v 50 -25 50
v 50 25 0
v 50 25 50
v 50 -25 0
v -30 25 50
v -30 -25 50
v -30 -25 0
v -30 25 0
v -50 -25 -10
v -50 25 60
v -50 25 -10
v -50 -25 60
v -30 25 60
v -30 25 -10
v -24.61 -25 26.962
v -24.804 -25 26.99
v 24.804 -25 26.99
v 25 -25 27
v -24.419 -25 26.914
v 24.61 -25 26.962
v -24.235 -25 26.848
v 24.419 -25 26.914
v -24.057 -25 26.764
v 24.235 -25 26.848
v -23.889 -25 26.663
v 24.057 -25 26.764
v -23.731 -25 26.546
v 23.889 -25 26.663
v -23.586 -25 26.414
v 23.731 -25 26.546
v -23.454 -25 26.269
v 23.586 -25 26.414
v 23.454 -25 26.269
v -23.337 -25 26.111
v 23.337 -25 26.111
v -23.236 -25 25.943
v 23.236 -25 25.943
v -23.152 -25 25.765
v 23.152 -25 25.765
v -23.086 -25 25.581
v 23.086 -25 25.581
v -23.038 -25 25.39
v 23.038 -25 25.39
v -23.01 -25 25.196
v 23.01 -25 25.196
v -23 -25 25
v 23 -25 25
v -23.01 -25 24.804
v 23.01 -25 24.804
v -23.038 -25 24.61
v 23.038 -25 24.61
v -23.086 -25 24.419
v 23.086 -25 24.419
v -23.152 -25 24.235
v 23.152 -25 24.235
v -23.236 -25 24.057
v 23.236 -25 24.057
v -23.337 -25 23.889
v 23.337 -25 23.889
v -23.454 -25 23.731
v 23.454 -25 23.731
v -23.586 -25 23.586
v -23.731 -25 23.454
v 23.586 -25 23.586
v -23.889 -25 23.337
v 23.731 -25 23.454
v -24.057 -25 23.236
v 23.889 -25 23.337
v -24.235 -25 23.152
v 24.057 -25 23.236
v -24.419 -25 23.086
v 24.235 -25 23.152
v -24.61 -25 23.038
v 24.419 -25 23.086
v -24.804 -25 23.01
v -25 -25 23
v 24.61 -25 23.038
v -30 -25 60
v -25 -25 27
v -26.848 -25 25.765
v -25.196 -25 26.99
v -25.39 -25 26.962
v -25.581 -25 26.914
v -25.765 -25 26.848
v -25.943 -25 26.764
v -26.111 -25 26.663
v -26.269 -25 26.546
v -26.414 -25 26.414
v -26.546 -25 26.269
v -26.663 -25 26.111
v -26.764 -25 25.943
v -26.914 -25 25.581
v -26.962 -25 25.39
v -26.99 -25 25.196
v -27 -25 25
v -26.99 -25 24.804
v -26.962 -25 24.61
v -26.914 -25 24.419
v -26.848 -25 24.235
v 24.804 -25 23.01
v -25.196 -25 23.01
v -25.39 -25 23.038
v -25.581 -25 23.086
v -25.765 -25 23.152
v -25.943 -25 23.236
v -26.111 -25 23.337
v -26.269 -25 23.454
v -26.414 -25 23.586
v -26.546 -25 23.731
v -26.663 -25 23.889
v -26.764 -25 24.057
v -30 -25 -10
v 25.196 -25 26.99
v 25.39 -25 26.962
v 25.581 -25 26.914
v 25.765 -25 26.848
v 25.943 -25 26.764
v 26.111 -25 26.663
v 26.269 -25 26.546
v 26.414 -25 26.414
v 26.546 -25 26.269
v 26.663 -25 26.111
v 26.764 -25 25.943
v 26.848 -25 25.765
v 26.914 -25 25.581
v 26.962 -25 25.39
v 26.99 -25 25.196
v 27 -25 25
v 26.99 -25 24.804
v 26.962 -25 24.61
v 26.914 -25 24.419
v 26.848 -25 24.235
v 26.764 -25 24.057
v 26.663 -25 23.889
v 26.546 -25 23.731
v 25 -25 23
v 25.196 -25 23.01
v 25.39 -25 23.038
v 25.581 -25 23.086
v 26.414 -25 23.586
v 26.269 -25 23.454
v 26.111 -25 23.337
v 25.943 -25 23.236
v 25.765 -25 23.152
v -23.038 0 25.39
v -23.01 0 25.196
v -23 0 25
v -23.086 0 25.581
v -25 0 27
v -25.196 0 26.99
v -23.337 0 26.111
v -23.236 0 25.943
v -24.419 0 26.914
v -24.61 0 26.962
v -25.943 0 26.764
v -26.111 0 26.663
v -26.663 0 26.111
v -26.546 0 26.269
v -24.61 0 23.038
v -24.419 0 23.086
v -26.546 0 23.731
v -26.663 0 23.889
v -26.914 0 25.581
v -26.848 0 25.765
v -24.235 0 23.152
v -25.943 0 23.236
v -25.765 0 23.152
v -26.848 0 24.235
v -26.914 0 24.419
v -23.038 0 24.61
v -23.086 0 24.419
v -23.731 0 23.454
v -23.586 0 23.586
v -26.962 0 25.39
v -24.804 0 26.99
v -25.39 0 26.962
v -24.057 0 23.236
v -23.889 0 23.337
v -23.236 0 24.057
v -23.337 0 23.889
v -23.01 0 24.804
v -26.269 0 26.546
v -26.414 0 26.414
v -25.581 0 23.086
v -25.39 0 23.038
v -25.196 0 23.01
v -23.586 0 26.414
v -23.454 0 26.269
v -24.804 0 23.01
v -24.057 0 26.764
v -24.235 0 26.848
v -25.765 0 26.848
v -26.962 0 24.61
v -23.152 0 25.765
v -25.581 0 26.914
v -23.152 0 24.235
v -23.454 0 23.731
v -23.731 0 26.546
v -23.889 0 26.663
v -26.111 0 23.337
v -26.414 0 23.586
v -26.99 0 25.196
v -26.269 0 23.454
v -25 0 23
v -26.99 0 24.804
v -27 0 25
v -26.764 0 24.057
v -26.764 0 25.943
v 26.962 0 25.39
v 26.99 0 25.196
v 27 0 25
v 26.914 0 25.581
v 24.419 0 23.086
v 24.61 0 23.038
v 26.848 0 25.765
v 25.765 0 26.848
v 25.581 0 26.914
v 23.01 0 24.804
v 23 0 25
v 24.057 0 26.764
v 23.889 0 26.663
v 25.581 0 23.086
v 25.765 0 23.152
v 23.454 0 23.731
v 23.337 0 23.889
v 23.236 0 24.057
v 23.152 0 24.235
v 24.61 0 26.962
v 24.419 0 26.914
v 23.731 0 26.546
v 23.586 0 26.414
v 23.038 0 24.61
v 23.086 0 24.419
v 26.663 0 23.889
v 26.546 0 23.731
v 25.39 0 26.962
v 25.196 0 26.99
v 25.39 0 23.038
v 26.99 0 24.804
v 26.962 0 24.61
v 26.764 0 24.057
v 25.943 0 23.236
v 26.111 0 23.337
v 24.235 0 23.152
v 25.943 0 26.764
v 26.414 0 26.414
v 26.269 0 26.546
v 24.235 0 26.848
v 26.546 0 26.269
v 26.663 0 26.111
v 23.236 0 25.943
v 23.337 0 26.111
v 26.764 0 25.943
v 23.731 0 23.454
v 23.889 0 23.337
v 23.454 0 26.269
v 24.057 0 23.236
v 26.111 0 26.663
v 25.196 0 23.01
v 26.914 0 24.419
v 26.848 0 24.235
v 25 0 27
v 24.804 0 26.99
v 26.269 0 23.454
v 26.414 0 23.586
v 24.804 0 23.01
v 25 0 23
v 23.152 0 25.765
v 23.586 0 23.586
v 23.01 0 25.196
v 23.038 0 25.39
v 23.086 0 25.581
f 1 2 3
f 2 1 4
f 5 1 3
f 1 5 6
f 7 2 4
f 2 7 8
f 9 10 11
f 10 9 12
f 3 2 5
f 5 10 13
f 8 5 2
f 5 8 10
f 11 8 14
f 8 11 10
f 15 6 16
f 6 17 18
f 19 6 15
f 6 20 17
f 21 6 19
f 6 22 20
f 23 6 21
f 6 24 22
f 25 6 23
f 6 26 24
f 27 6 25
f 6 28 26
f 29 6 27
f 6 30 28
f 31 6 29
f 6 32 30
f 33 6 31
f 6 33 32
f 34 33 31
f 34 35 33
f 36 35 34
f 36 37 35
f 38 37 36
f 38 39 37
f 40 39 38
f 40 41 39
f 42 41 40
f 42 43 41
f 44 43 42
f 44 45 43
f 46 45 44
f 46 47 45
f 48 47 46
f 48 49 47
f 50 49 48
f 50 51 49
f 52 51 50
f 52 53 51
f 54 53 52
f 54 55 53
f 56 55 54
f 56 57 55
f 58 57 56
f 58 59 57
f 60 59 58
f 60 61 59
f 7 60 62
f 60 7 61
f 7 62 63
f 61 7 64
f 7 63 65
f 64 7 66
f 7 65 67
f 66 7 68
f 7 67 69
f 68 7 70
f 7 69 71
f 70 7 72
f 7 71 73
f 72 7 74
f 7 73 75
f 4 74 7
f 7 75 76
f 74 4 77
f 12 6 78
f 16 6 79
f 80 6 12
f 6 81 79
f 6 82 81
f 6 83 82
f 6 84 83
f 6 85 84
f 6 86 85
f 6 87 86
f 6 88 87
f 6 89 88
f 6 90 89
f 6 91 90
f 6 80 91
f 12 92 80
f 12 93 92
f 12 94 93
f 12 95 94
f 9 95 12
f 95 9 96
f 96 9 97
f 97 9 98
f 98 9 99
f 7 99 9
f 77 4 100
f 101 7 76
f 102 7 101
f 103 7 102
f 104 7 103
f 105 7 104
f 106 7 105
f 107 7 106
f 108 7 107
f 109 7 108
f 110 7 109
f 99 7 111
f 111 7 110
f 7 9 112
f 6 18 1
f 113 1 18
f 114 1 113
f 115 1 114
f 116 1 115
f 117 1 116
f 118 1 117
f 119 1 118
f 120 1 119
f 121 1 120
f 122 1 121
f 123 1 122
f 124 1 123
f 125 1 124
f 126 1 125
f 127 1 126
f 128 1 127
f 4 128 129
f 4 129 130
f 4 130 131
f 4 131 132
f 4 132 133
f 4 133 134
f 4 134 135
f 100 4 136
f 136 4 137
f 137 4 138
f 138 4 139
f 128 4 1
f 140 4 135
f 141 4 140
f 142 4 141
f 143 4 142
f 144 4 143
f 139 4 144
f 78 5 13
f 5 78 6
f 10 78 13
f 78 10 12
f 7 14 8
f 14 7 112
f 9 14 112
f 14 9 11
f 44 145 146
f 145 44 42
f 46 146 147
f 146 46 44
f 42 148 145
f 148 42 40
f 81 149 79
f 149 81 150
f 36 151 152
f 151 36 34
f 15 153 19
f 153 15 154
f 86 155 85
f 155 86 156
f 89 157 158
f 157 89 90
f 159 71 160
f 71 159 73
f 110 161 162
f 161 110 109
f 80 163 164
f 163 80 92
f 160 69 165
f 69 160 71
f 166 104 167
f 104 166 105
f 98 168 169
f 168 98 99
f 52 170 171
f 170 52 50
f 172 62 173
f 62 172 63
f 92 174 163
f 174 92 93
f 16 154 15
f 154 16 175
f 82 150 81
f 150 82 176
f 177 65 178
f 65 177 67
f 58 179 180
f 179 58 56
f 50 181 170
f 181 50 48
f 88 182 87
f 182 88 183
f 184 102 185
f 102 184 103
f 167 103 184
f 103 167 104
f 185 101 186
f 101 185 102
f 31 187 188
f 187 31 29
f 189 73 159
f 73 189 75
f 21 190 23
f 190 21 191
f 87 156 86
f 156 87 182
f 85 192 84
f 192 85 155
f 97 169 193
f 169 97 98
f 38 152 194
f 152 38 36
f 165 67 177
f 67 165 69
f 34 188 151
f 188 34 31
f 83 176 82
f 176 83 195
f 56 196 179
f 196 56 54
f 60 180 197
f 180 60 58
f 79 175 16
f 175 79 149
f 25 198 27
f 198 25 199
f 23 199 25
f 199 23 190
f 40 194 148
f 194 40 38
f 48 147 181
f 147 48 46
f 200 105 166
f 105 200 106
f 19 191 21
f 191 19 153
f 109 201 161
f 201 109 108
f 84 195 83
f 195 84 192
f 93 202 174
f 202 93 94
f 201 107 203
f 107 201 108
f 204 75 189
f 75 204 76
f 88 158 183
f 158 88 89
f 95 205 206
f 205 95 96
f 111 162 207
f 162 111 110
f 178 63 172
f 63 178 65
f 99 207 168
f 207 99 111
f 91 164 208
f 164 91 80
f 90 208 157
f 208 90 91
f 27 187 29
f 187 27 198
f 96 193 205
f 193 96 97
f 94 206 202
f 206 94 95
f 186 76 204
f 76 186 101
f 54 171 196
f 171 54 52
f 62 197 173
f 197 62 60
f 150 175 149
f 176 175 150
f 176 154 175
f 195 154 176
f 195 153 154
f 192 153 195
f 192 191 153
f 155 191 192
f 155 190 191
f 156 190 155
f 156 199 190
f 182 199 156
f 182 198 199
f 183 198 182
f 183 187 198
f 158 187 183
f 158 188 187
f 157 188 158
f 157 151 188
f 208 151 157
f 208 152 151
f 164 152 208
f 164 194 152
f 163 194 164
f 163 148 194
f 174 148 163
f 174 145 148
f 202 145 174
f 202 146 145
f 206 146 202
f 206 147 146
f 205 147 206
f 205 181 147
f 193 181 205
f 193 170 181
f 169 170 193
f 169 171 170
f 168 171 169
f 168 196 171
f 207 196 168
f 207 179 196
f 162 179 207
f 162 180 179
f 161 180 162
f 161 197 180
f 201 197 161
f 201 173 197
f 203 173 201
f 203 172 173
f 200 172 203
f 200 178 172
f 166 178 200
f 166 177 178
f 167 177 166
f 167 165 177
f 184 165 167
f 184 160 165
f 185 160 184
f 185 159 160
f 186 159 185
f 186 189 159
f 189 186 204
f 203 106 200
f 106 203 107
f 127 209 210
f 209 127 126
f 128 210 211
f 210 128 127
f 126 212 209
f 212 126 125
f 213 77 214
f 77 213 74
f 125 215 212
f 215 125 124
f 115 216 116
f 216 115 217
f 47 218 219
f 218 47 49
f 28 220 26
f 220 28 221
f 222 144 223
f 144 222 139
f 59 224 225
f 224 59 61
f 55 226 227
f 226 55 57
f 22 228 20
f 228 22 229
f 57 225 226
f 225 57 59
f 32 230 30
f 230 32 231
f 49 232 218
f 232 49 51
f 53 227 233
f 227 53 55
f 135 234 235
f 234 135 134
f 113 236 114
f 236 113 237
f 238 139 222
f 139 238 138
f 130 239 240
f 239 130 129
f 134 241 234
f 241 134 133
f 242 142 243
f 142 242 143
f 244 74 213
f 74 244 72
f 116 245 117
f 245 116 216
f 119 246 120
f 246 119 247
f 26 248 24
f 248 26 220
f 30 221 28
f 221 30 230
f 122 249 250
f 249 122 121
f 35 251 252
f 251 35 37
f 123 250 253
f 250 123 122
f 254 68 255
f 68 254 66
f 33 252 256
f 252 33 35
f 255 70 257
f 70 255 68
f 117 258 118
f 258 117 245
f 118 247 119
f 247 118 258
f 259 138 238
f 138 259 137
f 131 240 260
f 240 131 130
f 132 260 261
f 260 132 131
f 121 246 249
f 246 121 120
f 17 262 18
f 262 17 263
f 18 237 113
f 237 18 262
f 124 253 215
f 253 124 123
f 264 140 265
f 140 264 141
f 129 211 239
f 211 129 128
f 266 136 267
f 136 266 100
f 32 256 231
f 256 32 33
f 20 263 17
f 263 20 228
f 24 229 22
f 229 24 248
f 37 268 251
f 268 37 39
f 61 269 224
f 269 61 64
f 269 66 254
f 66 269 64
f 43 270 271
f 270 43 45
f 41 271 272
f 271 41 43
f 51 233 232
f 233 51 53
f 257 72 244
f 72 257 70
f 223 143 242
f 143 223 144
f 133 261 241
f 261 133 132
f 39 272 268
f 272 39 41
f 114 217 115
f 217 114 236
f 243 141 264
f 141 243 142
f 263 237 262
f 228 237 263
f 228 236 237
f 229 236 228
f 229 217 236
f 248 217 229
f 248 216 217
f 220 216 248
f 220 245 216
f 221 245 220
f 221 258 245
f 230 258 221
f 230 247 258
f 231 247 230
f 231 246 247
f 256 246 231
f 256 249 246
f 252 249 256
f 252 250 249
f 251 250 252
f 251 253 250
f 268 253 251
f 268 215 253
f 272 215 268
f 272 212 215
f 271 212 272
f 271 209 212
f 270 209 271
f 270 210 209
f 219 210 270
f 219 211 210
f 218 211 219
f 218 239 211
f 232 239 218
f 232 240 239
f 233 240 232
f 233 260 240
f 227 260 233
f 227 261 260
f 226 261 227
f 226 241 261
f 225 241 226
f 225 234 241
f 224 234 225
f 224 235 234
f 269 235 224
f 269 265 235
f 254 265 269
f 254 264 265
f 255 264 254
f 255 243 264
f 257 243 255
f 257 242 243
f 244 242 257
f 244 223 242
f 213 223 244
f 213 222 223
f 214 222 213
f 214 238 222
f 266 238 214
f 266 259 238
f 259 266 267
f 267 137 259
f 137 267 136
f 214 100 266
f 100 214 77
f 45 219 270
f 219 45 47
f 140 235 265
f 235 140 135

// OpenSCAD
module wedge_bracket() {
    difference() {
        union() {
            // Main body
            translate([-50, -25, 0])
                cube([100, 50, 50]);

            // Sloped face
            translate([-50, -25, 0])
                linear_extrude(height=50)
                    polygon(points=[[0, 0], [100, 0], [100, 50], [0, 25]]);
            
            // Vertical flange
            translate([-50, -25, 50])
                cube([20, 50, 10]);

            // Lower protruding foot
            translate([-50, -25, -10])
                cube([20, 50, 10]);
        }

        // Recessed/through holes
        translate([-25, 0, 25])
            rotate([90, 0, 0])
                cylinder(h=50, r=2, $fn=64);

        translate([25, 0, 25])
            rotate([90, 0, 0])
                cylinder(h=50, r=2, $fn=64);
    }
}

wedge_bracket();
